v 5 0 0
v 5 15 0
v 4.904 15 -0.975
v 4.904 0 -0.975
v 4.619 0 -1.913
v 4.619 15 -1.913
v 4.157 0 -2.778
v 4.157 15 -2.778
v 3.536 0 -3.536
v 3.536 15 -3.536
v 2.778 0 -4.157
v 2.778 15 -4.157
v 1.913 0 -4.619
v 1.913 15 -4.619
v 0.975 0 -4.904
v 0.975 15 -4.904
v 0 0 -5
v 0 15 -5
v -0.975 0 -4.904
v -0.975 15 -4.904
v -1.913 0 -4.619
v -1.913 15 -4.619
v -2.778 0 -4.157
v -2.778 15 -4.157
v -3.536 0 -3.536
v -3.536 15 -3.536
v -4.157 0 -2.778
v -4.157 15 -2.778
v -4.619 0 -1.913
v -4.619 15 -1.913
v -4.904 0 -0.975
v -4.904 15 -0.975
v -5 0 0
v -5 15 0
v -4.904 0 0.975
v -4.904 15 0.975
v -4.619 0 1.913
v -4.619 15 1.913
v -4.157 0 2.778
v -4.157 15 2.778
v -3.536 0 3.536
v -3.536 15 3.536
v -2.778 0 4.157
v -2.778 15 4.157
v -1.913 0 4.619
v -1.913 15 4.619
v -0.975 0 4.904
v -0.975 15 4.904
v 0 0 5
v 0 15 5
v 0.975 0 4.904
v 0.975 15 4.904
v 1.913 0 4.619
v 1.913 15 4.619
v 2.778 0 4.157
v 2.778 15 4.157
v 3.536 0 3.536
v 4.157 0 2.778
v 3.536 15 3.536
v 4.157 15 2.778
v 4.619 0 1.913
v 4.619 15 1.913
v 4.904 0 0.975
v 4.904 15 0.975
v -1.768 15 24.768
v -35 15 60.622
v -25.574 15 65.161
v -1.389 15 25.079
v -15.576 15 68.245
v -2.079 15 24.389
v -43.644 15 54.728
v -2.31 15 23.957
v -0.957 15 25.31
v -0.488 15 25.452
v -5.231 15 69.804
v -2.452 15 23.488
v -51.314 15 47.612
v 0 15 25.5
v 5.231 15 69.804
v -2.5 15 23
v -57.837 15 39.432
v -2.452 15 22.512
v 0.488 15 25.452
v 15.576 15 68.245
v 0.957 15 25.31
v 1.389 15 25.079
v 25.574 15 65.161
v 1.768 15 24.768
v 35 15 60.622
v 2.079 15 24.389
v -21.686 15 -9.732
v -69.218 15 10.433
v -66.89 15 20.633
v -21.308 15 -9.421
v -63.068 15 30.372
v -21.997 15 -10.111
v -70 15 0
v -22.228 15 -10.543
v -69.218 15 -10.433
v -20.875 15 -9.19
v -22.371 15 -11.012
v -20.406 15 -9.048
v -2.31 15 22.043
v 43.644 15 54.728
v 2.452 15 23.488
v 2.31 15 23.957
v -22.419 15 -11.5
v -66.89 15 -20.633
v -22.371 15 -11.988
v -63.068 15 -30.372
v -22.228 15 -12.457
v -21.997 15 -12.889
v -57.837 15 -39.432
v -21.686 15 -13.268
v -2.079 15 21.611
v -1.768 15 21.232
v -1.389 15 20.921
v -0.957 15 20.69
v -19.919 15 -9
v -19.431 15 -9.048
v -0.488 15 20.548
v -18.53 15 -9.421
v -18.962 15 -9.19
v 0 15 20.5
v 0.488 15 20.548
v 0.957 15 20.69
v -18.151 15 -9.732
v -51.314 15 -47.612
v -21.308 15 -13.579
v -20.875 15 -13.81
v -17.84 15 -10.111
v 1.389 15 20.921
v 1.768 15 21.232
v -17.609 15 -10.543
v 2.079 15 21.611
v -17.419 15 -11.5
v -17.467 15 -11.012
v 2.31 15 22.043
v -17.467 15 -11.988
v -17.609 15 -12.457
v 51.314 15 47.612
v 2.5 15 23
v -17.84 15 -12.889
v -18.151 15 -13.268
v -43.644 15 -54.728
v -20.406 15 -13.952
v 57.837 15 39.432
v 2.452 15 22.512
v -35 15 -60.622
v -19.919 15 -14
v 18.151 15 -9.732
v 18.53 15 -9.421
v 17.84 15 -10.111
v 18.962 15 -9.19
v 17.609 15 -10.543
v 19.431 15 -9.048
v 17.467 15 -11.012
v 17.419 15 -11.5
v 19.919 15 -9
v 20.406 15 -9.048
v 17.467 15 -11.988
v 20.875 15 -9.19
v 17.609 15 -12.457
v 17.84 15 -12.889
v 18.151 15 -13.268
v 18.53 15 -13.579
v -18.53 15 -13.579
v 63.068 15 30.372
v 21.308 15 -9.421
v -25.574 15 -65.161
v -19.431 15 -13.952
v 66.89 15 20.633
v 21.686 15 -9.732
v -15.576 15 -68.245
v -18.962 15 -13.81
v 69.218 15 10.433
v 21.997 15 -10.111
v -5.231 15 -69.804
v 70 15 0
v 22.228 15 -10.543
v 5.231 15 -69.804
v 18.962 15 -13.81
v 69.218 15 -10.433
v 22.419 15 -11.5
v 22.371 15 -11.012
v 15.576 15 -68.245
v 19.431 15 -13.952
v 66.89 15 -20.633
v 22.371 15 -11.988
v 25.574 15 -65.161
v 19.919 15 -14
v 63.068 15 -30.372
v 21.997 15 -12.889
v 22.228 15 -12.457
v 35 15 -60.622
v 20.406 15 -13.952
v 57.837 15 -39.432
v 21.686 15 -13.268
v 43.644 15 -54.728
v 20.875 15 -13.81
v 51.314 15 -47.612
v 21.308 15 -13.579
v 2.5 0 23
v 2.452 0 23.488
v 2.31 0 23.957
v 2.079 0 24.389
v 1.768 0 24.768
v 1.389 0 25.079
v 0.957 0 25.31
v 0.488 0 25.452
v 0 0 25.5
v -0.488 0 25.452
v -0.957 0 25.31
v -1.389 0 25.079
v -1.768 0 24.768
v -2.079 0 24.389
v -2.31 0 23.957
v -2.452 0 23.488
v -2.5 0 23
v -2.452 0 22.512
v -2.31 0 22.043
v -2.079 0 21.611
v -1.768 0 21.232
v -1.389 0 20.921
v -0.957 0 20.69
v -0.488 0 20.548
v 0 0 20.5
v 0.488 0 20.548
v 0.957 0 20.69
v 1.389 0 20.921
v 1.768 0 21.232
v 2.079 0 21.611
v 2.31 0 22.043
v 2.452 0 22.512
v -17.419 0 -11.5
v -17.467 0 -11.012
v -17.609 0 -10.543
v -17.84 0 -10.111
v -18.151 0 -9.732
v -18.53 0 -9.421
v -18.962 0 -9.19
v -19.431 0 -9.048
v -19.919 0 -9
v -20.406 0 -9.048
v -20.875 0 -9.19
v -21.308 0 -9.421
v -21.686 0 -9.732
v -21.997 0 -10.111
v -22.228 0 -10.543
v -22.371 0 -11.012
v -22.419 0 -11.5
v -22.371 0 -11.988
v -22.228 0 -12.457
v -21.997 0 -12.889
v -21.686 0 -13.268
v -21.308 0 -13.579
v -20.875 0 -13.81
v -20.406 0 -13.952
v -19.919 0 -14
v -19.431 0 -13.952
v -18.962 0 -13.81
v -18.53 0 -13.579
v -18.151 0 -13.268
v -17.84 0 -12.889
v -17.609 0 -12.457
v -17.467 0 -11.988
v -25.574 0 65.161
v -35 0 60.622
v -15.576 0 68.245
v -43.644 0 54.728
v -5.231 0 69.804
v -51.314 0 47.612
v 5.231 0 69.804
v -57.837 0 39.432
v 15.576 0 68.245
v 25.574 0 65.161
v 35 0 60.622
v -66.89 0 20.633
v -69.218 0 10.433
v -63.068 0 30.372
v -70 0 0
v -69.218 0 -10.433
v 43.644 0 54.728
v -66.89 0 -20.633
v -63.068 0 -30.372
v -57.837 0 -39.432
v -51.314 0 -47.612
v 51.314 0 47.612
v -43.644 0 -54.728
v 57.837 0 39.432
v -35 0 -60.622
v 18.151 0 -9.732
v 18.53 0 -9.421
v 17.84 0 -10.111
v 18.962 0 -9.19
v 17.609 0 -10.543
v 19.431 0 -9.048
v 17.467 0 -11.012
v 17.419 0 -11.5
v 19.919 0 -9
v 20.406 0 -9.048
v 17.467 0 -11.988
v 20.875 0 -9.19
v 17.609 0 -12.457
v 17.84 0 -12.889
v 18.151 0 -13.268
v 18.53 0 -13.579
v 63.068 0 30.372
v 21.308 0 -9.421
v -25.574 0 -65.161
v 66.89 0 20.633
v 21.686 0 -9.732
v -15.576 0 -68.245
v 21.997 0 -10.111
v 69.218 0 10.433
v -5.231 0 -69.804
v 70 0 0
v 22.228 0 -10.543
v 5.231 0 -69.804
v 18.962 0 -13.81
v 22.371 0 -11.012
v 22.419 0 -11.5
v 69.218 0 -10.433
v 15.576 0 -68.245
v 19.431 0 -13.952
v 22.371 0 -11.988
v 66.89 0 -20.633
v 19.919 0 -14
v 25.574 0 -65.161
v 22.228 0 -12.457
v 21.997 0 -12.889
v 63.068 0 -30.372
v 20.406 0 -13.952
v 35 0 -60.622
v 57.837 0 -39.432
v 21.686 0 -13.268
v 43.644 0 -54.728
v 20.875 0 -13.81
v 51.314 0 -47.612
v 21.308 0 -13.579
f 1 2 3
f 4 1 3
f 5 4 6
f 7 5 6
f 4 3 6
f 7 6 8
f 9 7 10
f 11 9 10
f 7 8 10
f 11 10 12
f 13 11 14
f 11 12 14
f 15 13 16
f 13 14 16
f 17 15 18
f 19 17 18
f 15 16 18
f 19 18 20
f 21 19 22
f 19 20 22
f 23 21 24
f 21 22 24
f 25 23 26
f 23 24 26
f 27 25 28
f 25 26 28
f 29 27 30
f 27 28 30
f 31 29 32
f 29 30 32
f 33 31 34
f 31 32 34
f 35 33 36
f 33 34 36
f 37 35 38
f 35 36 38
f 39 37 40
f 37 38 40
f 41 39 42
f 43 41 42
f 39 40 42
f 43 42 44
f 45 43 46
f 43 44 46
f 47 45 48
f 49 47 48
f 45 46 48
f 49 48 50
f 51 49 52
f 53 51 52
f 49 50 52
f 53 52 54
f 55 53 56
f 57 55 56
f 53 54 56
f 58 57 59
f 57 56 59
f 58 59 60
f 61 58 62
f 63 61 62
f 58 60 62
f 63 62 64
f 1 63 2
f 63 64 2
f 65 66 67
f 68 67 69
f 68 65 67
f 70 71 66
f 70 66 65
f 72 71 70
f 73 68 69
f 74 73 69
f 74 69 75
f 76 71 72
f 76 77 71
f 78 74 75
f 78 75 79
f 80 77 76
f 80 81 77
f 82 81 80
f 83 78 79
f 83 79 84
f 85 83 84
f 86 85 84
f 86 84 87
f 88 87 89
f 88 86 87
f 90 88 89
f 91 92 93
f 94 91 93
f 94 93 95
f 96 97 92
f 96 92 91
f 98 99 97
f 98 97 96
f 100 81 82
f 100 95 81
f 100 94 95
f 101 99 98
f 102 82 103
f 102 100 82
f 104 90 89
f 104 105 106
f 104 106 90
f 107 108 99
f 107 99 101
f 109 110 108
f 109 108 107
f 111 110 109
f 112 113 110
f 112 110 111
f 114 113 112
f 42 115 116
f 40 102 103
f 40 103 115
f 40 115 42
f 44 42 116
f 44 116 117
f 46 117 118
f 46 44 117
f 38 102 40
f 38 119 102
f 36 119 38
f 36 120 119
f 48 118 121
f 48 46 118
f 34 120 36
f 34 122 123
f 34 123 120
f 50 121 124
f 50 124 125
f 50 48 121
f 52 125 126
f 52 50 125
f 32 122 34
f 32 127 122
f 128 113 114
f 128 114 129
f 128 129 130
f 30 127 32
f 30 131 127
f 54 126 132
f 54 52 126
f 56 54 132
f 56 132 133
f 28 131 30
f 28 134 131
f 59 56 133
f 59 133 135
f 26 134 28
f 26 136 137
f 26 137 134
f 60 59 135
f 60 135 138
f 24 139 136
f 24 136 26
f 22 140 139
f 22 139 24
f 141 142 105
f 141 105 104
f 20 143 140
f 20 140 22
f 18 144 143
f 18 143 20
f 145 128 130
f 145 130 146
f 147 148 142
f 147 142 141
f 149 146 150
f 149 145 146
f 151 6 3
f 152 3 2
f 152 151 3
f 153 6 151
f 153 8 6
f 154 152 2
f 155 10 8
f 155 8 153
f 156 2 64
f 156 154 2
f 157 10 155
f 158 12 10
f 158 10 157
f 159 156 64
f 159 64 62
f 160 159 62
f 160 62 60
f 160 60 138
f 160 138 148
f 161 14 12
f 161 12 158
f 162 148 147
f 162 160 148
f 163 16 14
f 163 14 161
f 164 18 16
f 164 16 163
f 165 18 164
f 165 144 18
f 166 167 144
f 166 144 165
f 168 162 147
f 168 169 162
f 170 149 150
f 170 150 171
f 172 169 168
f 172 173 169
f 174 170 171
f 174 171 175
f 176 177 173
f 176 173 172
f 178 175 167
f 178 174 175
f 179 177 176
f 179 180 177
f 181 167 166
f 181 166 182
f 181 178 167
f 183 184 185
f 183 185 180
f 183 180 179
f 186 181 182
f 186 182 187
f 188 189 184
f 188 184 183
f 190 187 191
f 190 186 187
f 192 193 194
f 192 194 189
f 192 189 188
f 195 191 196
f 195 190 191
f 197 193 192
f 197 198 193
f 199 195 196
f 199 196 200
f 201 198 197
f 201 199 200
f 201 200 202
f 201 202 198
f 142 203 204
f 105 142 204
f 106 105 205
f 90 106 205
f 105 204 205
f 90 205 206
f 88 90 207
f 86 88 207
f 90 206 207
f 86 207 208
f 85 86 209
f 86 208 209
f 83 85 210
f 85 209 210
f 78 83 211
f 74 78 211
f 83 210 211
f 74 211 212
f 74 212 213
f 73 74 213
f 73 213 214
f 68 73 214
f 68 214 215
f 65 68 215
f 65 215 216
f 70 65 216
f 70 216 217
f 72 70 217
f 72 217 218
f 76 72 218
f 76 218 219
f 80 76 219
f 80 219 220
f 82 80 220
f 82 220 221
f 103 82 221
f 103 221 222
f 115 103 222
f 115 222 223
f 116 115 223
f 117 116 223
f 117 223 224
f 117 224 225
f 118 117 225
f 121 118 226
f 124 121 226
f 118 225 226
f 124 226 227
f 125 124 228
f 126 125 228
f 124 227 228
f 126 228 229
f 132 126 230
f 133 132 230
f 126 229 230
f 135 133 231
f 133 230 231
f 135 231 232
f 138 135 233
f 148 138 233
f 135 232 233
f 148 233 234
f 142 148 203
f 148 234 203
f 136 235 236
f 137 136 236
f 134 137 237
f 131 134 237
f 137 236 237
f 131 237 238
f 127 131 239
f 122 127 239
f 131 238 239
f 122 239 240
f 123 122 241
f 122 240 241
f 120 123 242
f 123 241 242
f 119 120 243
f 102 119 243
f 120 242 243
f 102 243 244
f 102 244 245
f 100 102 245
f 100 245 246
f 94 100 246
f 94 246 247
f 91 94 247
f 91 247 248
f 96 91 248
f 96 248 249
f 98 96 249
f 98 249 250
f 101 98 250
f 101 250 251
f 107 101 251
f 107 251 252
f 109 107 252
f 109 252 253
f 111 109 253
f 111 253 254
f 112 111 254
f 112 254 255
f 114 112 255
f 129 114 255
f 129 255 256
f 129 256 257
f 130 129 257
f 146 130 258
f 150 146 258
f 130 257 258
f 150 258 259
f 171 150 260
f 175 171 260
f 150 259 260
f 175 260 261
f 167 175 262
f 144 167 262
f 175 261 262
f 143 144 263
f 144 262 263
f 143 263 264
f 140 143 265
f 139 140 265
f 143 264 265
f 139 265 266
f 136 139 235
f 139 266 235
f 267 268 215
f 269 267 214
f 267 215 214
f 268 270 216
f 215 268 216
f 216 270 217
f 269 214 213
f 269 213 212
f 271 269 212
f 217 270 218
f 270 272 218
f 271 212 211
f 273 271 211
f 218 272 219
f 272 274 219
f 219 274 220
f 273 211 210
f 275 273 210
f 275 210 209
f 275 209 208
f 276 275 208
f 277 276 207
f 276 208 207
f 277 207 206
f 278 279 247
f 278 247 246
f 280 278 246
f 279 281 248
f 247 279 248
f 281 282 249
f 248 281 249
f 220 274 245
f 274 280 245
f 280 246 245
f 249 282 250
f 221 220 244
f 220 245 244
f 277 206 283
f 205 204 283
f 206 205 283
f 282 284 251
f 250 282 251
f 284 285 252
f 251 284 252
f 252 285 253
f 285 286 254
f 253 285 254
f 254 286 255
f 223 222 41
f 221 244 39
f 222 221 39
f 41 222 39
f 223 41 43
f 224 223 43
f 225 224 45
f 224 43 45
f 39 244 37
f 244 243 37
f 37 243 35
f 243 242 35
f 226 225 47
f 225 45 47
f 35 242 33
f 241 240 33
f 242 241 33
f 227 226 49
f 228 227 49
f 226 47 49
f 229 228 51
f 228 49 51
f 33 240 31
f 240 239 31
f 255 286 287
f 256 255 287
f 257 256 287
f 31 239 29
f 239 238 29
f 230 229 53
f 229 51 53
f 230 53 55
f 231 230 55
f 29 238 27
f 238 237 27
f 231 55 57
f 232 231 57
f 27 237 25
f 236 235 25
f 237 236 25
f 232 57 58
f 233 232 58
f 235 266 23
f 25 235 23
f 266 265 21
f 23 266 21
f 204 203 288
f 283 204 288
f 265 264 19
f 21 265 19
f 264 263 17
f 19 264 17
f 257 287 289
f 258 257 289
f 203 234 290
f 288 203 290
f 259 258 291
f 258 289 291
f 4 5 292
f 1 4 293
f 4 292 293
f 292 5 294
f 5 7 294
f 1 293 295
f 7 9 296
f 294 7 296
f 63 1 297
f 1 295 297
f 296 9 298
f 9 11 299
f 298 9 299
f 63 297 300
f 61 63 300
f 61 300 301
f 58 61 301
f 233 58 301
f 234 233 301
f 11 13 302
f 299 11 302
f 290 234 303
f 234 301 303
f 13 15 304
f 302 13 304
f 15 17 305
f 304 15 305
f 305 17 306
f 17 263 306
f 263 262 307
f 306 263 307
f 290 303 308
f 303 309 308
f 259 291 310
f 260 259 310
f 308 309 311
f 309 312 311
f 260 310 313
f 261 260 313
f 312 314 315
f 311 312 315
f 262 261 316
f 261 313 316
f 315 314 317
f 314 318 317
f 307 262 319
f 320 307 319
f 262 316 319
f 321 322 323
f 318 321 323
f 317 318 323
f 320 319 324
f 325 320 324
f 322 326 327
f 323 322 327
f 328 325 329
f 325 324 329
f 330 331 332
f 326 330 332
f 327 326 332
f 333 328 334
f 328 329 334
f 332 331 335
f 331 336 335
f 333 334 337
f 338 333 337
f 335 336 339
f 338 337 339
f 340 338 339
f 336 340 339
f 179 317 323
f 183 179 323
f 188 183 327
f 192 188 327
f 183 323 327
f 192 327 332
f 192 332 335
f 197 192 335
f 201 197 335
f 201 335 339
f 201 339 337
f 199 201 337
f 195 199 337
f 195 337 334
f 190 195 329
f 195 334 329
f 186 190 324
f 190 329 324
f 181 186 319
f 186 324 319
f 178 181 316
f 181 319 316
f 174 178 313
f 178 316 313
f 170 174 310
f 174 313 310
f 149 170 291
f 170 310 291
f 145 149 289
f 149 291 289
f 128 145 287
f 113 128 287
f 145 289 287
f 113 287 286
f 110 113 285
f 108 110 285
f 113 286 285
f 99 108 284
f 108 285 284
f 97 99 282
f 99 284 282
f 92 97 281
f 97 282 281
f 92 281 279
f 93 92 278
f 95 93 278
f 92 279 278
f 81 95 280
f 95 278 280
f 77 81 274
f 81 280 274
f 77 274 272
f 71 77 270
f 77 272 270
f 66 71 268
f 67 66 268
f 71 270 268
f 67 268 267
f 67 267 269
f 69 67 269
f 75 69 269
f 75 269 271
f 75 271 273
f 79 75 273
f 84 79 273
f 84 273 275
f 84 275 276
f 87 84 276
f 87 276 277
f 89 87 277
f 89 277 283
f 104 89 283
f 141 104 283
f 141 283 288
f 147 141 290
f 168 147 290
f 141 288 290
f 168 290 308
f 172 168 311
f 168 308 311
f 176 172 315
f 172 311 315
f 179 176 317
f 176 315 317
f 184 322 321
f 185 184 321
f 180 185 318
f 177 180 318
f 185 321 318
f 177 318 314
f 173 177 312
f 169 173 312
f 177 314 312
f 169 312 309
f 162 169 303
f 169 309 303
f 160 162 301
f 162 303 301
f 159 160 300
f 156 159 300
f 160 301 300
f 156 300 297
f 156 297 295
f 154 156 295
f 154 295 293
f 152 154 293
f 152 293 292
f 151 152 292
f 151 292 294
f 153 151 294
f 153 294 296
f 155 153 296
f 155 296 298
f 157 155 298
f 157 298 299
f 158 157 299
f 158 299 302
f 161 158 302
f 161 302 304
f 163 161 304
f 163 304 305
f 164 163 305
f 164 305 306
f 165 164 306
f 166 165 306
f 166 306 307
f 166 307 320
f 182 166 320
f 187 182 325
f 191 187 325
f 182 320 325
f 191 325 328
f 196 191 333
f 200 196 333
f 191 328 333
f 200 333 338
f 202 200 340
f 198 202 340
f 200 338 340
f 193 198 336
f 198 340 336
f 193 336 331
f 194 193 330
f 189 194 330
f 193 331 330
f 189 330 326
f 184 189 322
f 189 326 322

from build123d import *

# Parameters (mm, degrees)
SKETCH1_R           = 70
BOSS_EXTRUDE1_DEPTH = 15
SKETCH2_R           = 5
CUT_EXTRUDE1_DEPTH  = 15
SKETCH3_R           = 2.5
CUT_EXTRUDE2_DEPTH  = 16


with BuildPart() as part:
    # Sketch1 → Boss-Extrude1 (new body)
    with BuildSketch(Plane(origin=(0, 0, 0), x_dir=(1, 0, 0), z_dir=(0, 1, 0))):
        Circle(SKETCH1_R)
    extrude(amount=BOSS_EXTRUDE1_DEPTH)

    # Sketch2 → Cut-Extrude1 (cut)
    with BuildSketch(Plane(origin=(0, 15, 0), x_dir=(1, 0, 0), z_dir=(0, 1, 0))):
        Circle(SKETCH2_R)
    extrude(amount=-CUT_EXTRUDE1_DEPTH, mode=Mode.SUBTRACT)

    # Sketch3 → Cut-Extrude2 (cut, through all)
    with BuildSketch(Plane.XZ):
        with Locations((0, 23)):
            Circle(SKETCH3_R)
        with Locations((19.918584287, -11.5)):
            Circle(SKETCH3_R)
        with Locations((-19.918584287, -11.5)):
            Circle(SKETCH3_R)
    extrude(amount=-CUT_EXTRUDE2_DEPTH, mode=Mode.SUBTRACT)


solid = part.part
